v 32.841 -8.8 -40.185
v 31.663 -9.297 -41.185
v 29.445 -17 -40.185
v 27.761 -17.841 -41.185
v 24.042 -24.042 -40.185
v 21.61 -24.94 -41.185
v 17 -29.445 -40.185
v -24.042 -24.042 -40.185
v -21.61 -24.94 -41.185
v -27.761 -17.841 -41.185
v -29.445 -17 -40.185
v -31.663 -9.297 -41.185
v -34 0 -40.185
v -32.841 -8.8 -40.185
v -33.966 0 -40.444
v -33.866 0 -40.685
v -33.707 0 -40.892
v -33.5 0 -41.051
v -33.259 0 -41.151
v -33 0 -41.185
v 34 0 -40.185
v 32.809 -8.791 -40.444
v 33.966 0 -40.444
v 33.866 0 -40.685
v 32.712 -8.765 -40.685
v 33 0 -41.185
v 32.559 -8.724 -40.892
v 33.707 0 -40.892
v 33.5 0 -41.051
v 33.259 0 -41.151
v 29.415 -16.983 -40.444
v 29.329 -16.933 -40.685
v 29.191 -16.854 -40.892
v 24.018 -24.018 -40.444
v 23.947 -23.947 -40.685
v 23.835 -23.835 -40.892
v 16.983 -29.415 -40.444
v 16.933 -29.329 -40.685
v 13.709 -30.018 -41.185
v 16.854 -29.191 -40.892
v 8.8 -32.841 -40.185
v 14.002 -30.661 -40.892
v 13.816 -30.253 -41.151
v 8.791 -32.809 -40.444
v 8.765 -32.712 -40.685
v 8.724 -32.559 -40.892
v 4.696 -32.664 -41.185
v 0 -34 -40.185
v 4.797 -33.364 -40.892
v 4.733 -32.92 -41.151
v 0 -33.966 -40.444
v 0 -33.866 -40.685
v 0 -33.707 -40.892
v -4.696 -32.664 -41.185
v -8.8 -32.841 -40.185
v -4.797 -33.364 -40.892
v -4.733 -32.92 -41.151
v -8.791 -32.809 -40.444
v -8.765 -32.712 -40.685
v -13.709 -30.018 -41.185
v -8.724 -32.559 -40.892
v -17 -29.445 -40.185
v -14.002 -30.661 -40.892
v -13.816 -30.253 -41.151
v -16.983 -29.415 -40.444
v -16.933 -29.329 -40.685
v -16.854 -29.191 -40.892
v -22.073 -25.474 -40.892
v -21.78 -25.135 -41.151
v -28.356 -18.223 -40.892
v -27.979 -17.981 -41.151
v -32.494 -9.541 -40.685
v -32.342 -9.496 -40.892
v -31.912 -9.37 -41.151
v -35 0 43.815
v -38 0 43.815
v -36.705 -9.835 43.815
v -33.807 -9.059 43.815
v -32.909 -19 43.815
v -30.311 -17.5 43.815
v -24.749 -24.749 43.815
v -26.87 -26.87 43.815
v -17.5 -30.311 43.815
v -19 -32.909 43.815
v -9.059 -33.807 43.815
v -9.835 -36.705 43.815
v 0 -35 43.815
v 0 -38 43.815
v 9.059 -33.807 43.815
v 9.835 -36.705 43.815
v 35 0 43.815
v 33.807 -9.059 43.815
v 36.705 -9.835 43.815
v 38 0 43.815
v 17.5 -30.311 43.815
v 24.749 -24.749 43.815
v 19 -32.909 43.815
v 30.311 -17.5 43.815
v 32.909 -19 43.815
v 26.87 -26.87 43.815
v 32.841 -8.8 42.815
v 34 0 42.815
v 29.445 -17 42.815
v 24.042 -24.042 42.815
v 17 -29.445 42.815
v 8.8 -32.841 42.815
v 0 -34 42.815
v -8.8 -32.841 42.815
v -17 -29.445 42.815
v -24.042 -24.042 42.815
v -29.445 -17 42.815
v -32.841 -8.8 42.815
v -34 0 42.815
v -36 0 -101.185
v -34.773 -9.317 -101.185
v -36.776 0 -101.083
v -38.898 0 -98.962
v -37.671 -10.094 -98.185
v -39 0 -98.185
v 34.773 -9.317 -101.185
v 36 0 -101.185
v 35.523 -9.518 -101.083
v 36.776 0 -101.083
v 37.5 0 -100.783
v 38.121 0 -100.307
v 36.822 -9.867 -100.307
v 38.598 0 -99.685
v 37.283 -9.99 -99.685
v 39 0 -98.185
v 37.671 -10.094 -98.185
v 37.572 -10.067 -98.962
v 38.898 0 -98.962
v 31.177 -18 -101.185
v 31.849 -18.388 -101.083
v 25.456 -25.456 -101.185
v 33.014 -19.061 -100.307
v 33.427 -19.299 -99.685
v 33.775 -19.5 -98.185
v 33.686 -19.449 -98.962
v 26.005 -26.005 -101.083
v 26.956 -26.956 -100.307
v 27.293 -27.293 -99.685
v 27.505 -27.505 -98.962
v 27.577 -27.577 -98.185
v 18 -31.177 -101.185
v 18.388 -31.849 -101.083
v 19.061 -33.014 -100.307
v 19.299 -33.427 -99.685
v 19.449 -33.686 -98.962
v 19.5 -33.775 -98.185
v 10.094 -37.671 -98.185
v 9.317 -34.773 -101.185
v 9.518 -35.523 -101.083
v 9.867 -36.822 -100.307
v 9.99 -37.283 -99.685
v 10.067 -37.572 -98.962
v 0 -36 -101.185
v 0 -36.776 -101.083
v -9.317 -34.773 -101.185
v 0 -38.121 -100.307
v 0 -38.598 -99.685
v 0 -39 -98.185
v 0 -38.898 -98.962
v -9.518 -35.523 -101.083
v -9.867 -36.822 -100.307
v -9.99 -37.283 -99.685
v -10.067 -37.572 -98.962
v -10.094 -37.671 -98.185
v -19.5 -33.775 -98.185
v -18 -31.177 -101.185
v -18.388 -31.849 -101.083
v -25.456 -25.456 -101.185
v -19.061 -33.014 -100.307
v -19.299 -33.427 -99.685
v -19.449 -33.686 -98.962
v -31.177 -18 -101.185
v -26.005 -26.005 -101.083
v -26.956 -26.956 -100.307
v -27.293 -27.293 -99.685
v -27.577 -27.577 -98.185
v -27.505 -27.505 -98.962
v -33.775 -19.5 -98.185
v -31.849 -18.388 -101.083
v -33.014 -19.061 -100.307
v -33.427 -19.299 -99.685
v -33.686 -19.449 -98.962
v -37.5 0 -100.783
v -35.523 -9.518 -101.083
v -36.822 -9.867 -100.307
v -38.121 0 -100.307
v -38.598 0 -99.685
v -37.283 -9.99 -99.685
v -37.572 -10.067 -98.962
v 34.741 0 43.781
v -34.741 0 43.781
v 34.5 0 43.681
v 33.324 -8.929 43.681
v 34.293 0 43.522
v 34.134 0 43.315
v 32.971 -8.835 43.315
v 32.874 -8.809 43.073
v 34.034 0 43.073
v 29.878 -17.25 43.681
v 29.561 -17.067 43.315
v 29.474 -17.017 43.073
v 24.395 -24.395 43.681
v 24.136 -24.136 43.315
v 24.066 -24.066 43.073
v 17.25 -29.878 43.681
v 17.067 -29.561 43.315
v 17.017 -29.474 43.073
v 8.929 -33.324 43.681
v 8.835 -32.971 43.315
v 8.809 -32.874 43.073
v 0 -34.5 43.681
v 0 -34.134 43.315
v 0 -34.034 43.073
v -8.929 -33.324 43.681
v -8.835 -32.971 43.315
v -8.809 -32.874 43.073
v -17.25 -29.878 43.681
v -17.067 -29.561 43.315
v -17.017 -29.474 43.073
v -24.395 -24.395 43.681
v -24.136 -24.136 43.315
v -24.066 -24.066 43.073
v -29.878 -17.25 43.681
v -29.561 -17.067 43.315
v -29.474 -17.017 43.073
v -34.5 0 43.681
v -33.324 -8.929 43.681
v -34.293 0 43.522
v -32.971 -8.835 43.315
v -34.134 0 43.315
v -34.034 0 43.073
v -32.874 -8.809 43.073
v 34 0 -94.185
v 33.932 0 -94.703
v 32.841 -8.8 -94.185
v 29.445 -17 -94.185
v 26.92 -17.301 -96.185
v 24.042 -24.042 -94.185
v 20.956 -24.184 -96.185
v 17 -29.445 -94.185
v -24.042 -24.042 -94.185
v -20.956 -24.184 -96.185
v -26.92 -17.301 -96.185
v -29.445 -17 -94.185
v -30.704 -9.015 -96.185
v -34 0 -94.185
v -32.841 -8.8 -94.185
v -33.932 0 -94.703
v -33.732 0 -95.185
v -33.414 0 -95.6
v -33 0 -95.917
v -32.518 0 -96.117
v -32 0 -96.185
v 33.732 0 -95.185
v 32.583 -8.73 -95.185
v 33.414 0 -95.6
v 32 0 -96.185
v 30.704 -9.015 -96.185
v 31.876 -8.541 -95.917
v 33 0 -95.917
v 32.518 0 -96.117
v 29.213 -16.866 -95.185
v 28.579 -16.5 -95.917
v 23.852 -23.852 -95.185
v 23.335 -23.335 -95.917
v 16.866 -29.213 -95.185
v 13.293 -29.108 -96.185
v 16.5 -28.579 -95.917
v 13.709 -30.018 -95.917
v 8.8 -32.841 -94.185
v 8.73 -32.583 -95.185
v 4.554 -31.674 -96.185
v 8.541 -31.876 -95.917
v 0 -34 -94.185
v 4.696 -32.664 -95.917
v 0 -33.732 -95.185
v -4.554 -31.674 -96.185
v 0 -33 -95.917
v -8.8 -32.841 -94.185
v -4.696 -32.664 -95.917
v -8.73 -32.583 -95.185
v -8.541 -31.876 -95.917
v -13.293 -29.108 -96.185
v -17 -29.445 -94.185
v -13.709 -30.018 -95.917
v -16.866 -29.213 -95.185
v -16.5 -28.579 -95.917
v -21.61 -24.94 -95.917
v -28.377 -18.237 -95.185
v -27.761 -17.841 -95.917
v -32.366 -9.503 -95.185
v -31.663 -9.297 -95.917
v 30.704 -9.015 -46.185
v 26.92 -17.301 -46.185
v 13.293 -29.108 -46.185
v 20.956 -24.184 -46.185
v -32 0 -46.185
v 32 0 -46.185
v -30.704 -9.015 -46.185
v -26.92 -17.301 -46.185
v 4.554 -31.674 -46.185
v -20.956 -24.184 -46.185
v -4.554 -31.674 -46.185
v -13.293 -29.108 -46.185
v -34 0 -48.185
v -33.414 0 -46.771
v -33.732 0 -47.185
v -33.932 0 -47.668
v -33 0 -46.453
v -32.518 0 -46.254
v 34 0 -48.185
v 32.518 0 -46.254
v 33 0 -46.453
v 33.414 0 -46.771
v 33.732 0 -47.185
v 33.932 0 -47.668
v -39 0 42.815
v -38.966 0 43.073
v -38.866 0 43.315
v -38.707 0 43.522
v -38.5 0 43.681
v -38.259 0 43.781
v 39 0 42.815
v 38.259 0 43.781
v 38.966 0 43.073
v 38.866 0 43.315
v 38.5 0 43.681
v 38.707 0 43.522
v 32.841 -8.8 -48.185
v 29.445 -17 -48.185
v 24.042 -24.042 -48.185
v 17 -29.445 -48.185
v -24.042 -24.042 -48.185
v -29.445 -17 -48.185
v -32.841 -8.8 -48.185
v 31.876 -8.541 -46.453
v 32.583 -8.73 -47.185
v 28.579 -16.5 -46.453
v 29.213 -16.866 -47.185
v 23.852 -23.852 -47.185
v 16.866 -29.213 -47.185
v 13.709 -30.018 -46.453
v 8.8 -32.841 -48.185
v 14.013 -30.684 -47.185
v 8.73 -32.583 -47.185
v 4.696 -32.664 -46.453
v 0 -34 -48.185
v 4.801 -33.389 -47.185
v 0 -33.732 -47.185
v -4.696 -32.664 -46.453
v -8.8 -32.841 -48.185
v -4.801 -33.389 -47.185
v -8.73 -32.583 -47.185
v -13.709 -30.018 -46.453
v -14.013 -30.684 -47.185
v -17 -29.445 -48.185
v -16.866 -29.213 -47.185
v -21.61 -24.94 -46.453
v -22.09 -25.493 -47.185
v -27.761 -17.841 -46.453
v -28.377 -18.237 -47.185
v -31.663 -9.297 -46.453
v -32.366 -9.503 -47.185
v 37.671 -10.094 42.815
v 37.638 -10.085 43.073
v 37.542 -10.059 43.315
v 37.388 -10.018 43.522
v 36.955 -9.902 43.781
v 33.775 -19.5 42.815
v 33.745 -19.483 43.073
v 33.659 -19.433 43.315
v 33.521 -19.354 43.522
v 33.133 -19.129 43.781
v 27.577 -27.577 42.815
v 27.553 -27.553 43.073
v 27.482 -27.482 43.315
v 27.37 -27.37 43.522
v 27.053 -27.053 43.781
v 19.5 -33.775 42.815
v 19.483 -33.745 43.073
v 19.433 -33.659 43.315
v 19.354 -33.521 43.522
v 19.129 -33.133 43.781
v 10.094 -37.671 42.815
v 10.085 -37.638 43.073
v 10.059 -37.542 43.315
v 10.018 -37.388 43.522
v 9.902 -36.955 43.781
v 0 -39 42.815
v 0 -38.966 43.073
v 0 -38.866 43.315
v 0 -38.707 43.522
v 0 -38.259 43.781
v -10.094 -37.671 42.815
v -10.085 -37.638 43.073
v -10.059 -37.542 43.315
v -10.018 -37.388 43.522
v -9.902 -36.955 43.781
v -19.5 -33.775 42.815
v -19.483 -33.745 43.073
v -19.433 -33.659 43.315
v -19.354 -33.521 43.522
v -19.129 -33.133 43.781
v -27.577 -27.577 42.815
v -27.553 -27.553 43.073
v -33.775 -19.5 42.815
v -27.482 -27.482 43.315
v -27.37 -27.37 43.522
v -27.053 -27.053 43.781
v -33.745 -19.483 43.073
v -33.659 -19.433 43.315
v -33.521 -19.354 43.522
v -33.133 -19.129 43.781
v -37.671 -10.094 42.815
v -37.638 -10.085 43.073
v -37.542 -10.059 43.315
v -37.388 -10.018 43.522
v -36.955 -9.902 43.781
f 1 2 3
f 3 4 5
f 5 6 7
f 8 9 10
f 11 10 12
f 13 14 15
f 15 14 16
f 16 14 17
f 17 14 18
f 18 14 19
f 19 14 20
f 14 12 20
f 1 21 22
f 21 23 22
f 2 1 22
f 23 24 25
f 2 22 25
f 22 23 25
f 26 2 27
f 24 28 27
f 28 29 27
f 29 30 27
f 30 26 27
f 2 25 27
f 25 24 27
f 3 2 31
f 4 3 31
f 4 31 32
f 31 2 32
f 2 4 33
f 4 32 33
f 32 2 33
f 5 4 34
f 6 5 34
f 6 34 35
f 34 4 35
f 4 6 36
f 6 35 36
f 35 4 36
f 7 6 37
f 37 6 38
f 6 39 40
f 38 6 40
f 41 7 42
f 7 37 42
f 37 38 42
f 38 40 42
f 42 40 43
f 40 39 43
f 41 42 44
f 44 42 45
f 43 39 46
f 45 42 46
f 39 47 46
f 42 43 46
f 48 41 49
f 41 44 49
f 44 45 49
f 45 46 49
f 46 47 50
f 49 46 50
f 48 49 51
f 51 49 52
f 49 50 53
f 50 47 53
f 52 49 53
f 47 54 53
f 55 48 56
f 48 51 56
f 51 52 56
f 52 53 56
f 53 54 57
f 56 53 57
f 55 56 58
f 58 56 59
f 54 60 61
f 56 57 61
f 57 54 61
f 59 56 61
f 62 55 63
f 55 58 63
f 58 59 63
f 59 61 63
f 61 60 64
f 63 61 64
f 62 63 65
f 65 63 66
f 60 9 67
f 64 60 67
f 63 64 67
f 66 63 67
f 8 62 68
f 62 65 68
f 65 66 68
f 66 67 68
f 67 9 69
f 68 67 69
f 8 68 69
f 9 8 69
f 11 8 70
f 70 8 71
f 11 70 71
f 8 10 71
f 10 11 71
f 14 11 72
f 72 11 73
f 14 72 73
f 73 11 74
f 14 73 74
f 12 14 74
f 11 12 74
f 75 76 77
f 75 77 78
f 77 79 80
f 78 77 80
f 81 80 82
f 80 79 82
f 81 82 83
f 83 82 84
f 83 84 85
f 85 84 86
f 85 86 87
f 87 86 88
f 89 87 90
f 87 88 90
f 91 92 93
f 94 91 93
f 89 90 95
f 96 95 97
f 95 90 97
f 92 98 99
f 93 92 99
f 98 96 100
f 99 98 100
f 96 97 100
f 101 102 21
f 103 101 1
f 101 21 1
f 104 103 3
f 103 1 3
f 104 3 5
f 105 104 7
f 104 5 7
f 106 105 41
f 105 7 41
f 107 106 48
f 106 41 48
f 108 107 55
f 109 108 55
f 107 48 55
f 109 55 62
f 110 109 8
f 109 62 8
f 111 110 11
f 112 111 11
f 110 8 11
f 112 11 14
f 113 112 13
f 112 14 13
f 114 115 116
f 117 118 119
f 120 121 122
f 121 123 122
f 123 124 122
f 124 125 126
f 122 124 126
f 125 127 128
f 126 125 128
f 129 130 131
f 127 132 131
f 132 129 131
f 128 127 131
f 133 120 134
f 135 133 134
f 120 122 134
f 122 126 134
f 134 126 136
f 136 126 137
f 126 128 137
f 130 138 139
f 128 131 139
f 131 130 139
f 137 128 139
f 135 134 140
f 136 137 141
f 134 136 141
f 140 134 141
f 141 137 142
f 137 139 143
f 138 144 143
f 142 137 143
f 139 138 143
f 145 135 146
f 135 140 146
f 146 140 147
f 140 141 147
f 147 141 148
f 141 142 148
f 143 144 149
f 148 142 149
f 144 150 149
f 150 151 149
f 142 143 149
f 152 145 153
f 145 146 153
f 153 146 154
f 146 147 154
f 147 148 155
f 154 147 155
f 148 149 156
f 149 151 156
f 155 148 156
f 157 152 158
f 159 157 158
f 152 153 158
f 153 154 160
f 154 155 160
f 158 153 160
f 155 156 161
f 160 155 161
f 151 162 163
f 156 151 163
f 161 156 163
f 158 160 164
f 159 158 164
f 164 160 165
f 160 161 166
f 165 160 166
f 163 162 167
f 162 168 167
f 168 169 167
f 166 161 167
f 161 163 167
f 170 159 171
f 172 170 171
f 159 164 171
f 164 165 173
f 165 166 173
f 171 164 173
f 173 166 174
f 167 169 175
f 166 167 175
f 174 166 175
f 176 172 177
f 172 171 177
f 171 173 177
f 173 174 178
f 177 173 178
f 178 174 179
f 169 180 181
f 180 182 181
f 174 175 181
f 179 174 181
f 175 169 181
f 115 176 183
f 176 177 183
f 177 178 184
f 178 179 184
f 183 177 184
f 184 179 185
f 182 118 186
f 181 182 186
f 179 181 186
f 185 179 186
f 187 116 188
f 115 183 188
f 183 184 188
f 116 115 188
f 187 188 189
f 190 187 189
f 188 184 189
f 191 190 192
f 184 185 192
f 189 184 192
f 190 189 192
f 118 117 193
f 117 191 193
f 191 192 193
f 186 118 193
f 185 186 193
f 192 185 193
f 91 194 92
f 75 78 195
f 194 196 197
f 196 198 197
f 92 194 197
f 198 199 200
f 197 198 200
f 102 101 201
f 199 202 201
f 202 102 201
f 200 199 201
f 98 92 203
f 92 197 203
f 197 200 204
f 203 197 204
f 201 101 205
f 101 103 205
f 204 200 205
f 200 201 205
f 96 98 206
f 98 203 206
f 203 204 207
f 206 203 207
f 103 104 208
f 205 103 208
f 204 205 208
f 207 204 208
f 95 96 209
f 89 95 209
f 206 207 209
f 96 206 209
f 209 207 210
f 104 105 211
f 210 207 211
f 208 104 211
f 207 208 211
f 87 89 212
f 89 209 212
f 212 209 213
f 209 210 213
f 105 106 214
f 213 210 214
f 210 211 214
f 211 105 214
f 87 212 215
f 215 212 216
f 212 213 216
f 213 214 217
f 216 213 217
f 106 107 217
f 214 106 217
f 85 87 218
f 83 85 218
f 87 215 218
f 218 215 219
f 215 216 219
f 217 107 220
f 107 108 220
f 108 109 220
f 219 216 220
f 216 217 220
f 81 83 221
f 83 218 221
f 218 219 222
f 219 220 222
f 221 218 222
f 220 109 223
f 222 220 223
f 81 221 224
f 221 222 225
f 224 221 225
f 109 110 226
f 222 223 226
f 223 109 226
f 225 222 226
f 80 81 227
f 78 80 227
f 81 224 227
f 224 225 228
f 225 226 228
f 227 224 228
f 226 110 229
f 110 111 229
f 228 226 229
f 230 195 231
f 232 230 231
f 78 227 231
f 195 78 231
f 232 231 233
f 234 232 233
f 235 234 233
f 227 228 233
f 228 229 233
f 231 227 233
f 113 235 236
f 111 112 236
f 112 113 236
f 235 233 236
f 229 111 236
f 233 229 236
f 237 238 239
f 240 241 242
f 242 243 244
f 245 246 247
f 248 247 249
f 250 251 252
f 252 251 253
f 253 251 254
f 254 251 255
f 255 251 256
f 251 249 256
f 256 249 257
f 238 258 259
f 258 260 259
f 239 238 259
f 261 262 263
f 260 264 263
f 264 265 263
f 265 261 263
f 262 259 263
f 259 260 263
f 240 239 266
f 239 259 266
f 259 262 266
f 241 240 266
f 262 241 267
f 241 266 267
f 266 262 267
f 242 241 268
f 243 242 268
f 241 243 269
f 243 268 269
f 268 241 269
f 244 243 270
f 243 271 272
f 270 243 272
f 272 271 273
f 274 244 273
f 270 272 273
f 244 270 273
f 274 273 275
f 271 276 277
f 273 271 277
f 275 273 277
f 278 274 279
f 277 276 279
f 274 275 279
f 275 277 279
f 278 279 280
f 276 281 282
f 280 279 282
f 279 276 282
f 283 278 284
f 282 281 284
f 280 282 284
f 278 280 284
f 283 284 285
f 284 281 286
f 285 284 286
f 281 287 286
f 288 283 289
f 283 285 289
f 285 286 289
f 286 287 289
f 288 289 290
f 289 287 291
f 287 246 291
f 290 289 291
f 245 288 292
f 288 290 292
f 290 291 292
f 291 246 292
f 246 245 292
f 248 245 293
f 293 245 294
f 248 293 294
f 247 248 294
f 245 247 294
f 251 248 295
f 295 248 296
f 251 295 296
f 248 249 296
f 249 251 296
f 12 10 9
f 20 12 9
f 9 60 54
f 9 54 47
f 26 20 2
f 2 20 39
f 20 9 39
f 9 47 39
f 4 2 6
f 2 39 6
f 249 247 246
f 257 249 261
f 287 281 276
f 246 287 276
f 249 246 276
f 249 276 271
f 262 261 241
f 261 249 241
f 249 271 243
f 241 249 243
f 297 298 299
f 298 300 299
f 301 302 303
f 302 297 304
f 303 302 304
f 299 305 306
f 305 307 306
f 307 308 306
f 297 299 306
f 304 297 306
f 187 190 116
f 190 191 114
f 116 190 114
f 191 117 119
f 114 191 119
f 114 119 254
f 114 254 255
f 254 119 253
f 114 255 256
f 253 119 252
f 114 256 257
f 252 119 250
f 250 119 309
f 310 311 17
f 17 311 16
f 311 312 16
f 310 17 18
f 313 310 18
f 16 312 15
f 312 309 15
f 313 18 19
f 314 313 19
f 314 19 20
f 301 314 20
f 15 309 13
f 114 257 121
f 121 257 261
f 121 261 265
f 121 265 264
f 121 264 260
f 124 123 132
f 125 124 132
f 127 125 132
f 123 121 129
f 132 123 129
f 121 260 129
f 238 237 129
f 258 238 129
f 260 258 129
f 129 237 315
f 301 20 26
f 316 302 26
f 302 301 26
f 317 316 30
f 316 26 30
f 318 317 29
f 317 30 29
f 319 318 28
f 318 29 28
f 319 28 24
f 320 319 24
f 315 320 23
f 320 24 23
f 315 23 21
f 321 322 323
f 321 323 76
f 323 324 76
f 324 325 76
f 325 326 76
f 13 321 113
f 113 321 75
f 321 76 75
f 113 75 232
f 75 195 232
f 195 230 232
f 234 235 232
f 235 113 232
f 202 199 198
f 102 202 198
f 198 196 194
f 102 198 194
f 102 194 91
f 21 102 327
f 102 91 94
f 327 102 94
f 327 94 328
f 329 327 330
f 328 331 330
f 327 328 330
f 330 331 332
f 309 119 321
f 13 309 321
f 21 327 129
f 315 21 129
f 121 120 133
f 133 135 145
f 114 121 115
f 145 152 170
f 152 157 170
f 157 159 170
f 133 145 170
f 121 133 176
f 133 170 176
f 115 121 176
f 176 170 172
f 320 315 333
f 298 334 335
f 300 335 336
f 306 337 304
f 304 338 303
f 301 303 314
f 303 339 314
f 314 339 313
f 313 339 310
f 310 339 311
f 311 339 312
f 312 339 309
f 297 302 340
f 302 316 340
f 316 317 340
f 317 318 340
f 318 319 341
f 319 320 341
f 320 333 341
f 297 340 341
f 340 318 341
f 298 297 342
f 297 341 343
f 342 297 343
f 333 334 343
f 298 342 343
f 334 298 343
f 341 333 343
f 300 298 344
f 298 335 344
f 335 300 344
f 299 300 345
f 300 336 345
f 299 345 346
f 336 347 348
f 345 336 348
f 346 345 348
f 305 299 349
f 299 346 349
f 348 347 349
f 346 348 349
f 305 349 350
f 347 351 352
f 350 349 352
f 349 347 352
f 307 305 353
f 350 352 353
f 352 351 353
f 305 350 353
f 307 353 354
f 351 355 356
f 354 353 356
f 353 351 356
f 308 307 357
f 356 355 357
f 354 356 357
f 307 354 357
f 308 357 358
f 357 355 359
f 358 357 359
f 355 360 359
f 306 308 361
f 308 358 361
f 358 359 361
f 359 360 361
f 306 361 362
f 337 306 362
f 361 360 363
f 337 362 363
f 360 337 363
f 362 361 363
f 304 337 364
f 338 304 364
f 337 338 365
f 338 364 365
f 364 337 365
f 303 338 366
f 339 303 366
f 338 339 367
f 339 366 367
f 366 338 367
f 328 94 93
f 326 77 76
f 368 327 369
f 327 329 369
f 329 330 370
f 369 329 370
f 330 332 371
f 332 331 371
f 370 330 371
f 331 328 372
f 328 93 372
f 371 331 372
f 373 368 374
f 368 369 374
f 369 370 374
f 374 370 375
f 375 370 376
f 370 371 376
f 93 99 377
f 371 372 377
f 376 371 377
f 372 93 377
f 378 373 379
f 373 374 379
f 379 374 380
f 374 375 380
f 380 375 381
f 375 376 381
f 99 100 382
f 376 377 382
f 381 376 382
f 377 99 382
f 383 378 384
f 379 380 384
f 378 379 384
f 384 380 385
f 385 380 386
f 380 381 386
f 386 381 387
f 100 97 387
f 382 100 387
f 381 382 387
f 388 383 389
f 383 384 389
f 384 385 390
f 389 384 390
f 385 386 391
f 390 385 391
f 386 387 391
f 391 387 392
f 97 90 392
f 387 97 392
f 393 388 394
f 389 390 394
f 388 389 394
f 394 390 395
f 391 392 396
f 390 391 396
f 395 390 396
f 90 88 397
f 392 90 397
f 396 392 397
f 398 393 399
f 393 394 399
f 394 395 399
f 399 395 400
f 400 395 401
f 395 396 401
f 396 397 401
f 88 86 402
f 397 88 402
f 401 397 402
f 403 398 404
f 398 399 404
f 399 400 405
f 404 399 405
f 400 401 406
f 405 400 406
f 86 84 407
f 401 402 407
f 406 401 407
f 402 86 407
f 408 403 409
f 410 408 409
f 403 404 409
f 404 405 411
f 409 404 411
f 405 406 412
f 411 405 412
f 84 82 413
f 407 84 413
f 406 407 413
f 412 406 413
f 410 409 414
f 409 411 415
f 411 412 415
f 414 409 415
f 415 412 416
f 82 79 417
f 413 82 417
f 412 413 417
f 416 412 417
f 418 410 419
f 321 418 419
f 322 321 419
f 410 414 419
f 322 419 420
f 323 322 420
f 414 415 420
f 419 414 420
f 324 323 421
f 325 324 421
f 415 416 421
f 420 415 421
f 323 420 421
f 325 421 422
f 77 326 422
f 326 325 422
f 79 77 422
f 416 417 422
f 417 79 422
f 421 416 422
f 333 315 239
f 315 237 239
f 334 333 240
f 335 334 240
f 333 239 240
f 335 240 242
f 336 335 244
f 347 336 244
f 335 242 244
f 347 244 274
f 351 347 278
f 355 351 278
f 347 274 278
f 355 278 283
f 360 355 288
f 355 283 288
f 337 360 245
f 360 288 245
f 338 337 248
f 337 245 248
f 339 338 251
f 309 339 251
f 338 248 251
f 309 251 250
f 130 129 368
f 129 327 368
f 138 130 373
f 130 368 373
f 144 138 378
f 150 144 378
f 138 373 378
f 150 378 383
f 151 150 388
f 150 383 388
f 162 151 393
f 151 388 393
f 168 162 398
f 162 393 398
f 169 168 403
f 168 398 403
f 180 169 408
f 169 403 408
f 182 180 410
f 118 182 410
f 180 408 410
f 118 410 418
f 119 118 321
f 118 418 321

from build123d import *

# Parameters (mm, degrees)
F1_ANGLE = 180


with BuildPart() as f1:
    # F0 (on Front) → F1 (revolve)
    with BuildSketch(Plane.XZ):
        with BuildLine():
            ThreePointArc((39, 42.814617), (38.707107, 43.521724), (38, 43.814617))
            Line((38, 43.814617), (35, 43.814617))
            ThreePointArc((35, 43.814617), (34.292893, 43.521724), (34, 42.814617))
            Line((34, 42.814617), (34, -40.185383))
            ThreePointArc((34, -40.185383), (33.707107, -40.89249), (33, -41.185383))
            Line((33, -41.185383), (0, -41.185383))
            Line((0, -41.185383), (0, -46.185383))
            Line((0, -46.185383), (32, -46.185383))
            ThreePointArc((32, -46.185383), (33.414214, -46.77117), (34, -48.185383))
            Line((34, -48.185383), (34, -94.185383))
            ThreePointArc((34, -94.185383), (33.414214, -95.599597), (32, -96.185383))
            Line((32, -96.185383), (0, -96.185383))
            Line((0, -96.185383), (0, -101.185383))
            Line((0, -101.185383), (36, -101.185383))
            ThreePointArc((36, -101.185383), (38.12132, -100.306703), (39, -98.185383))
            Line((39, -98.185383), (39, 42.814617))
        make_face()
    revolve(axis=Axis((0, 0, -39.313186), (0, 0, -1)), revolution_arc=F1_ANGLE)


solid = f1.part
